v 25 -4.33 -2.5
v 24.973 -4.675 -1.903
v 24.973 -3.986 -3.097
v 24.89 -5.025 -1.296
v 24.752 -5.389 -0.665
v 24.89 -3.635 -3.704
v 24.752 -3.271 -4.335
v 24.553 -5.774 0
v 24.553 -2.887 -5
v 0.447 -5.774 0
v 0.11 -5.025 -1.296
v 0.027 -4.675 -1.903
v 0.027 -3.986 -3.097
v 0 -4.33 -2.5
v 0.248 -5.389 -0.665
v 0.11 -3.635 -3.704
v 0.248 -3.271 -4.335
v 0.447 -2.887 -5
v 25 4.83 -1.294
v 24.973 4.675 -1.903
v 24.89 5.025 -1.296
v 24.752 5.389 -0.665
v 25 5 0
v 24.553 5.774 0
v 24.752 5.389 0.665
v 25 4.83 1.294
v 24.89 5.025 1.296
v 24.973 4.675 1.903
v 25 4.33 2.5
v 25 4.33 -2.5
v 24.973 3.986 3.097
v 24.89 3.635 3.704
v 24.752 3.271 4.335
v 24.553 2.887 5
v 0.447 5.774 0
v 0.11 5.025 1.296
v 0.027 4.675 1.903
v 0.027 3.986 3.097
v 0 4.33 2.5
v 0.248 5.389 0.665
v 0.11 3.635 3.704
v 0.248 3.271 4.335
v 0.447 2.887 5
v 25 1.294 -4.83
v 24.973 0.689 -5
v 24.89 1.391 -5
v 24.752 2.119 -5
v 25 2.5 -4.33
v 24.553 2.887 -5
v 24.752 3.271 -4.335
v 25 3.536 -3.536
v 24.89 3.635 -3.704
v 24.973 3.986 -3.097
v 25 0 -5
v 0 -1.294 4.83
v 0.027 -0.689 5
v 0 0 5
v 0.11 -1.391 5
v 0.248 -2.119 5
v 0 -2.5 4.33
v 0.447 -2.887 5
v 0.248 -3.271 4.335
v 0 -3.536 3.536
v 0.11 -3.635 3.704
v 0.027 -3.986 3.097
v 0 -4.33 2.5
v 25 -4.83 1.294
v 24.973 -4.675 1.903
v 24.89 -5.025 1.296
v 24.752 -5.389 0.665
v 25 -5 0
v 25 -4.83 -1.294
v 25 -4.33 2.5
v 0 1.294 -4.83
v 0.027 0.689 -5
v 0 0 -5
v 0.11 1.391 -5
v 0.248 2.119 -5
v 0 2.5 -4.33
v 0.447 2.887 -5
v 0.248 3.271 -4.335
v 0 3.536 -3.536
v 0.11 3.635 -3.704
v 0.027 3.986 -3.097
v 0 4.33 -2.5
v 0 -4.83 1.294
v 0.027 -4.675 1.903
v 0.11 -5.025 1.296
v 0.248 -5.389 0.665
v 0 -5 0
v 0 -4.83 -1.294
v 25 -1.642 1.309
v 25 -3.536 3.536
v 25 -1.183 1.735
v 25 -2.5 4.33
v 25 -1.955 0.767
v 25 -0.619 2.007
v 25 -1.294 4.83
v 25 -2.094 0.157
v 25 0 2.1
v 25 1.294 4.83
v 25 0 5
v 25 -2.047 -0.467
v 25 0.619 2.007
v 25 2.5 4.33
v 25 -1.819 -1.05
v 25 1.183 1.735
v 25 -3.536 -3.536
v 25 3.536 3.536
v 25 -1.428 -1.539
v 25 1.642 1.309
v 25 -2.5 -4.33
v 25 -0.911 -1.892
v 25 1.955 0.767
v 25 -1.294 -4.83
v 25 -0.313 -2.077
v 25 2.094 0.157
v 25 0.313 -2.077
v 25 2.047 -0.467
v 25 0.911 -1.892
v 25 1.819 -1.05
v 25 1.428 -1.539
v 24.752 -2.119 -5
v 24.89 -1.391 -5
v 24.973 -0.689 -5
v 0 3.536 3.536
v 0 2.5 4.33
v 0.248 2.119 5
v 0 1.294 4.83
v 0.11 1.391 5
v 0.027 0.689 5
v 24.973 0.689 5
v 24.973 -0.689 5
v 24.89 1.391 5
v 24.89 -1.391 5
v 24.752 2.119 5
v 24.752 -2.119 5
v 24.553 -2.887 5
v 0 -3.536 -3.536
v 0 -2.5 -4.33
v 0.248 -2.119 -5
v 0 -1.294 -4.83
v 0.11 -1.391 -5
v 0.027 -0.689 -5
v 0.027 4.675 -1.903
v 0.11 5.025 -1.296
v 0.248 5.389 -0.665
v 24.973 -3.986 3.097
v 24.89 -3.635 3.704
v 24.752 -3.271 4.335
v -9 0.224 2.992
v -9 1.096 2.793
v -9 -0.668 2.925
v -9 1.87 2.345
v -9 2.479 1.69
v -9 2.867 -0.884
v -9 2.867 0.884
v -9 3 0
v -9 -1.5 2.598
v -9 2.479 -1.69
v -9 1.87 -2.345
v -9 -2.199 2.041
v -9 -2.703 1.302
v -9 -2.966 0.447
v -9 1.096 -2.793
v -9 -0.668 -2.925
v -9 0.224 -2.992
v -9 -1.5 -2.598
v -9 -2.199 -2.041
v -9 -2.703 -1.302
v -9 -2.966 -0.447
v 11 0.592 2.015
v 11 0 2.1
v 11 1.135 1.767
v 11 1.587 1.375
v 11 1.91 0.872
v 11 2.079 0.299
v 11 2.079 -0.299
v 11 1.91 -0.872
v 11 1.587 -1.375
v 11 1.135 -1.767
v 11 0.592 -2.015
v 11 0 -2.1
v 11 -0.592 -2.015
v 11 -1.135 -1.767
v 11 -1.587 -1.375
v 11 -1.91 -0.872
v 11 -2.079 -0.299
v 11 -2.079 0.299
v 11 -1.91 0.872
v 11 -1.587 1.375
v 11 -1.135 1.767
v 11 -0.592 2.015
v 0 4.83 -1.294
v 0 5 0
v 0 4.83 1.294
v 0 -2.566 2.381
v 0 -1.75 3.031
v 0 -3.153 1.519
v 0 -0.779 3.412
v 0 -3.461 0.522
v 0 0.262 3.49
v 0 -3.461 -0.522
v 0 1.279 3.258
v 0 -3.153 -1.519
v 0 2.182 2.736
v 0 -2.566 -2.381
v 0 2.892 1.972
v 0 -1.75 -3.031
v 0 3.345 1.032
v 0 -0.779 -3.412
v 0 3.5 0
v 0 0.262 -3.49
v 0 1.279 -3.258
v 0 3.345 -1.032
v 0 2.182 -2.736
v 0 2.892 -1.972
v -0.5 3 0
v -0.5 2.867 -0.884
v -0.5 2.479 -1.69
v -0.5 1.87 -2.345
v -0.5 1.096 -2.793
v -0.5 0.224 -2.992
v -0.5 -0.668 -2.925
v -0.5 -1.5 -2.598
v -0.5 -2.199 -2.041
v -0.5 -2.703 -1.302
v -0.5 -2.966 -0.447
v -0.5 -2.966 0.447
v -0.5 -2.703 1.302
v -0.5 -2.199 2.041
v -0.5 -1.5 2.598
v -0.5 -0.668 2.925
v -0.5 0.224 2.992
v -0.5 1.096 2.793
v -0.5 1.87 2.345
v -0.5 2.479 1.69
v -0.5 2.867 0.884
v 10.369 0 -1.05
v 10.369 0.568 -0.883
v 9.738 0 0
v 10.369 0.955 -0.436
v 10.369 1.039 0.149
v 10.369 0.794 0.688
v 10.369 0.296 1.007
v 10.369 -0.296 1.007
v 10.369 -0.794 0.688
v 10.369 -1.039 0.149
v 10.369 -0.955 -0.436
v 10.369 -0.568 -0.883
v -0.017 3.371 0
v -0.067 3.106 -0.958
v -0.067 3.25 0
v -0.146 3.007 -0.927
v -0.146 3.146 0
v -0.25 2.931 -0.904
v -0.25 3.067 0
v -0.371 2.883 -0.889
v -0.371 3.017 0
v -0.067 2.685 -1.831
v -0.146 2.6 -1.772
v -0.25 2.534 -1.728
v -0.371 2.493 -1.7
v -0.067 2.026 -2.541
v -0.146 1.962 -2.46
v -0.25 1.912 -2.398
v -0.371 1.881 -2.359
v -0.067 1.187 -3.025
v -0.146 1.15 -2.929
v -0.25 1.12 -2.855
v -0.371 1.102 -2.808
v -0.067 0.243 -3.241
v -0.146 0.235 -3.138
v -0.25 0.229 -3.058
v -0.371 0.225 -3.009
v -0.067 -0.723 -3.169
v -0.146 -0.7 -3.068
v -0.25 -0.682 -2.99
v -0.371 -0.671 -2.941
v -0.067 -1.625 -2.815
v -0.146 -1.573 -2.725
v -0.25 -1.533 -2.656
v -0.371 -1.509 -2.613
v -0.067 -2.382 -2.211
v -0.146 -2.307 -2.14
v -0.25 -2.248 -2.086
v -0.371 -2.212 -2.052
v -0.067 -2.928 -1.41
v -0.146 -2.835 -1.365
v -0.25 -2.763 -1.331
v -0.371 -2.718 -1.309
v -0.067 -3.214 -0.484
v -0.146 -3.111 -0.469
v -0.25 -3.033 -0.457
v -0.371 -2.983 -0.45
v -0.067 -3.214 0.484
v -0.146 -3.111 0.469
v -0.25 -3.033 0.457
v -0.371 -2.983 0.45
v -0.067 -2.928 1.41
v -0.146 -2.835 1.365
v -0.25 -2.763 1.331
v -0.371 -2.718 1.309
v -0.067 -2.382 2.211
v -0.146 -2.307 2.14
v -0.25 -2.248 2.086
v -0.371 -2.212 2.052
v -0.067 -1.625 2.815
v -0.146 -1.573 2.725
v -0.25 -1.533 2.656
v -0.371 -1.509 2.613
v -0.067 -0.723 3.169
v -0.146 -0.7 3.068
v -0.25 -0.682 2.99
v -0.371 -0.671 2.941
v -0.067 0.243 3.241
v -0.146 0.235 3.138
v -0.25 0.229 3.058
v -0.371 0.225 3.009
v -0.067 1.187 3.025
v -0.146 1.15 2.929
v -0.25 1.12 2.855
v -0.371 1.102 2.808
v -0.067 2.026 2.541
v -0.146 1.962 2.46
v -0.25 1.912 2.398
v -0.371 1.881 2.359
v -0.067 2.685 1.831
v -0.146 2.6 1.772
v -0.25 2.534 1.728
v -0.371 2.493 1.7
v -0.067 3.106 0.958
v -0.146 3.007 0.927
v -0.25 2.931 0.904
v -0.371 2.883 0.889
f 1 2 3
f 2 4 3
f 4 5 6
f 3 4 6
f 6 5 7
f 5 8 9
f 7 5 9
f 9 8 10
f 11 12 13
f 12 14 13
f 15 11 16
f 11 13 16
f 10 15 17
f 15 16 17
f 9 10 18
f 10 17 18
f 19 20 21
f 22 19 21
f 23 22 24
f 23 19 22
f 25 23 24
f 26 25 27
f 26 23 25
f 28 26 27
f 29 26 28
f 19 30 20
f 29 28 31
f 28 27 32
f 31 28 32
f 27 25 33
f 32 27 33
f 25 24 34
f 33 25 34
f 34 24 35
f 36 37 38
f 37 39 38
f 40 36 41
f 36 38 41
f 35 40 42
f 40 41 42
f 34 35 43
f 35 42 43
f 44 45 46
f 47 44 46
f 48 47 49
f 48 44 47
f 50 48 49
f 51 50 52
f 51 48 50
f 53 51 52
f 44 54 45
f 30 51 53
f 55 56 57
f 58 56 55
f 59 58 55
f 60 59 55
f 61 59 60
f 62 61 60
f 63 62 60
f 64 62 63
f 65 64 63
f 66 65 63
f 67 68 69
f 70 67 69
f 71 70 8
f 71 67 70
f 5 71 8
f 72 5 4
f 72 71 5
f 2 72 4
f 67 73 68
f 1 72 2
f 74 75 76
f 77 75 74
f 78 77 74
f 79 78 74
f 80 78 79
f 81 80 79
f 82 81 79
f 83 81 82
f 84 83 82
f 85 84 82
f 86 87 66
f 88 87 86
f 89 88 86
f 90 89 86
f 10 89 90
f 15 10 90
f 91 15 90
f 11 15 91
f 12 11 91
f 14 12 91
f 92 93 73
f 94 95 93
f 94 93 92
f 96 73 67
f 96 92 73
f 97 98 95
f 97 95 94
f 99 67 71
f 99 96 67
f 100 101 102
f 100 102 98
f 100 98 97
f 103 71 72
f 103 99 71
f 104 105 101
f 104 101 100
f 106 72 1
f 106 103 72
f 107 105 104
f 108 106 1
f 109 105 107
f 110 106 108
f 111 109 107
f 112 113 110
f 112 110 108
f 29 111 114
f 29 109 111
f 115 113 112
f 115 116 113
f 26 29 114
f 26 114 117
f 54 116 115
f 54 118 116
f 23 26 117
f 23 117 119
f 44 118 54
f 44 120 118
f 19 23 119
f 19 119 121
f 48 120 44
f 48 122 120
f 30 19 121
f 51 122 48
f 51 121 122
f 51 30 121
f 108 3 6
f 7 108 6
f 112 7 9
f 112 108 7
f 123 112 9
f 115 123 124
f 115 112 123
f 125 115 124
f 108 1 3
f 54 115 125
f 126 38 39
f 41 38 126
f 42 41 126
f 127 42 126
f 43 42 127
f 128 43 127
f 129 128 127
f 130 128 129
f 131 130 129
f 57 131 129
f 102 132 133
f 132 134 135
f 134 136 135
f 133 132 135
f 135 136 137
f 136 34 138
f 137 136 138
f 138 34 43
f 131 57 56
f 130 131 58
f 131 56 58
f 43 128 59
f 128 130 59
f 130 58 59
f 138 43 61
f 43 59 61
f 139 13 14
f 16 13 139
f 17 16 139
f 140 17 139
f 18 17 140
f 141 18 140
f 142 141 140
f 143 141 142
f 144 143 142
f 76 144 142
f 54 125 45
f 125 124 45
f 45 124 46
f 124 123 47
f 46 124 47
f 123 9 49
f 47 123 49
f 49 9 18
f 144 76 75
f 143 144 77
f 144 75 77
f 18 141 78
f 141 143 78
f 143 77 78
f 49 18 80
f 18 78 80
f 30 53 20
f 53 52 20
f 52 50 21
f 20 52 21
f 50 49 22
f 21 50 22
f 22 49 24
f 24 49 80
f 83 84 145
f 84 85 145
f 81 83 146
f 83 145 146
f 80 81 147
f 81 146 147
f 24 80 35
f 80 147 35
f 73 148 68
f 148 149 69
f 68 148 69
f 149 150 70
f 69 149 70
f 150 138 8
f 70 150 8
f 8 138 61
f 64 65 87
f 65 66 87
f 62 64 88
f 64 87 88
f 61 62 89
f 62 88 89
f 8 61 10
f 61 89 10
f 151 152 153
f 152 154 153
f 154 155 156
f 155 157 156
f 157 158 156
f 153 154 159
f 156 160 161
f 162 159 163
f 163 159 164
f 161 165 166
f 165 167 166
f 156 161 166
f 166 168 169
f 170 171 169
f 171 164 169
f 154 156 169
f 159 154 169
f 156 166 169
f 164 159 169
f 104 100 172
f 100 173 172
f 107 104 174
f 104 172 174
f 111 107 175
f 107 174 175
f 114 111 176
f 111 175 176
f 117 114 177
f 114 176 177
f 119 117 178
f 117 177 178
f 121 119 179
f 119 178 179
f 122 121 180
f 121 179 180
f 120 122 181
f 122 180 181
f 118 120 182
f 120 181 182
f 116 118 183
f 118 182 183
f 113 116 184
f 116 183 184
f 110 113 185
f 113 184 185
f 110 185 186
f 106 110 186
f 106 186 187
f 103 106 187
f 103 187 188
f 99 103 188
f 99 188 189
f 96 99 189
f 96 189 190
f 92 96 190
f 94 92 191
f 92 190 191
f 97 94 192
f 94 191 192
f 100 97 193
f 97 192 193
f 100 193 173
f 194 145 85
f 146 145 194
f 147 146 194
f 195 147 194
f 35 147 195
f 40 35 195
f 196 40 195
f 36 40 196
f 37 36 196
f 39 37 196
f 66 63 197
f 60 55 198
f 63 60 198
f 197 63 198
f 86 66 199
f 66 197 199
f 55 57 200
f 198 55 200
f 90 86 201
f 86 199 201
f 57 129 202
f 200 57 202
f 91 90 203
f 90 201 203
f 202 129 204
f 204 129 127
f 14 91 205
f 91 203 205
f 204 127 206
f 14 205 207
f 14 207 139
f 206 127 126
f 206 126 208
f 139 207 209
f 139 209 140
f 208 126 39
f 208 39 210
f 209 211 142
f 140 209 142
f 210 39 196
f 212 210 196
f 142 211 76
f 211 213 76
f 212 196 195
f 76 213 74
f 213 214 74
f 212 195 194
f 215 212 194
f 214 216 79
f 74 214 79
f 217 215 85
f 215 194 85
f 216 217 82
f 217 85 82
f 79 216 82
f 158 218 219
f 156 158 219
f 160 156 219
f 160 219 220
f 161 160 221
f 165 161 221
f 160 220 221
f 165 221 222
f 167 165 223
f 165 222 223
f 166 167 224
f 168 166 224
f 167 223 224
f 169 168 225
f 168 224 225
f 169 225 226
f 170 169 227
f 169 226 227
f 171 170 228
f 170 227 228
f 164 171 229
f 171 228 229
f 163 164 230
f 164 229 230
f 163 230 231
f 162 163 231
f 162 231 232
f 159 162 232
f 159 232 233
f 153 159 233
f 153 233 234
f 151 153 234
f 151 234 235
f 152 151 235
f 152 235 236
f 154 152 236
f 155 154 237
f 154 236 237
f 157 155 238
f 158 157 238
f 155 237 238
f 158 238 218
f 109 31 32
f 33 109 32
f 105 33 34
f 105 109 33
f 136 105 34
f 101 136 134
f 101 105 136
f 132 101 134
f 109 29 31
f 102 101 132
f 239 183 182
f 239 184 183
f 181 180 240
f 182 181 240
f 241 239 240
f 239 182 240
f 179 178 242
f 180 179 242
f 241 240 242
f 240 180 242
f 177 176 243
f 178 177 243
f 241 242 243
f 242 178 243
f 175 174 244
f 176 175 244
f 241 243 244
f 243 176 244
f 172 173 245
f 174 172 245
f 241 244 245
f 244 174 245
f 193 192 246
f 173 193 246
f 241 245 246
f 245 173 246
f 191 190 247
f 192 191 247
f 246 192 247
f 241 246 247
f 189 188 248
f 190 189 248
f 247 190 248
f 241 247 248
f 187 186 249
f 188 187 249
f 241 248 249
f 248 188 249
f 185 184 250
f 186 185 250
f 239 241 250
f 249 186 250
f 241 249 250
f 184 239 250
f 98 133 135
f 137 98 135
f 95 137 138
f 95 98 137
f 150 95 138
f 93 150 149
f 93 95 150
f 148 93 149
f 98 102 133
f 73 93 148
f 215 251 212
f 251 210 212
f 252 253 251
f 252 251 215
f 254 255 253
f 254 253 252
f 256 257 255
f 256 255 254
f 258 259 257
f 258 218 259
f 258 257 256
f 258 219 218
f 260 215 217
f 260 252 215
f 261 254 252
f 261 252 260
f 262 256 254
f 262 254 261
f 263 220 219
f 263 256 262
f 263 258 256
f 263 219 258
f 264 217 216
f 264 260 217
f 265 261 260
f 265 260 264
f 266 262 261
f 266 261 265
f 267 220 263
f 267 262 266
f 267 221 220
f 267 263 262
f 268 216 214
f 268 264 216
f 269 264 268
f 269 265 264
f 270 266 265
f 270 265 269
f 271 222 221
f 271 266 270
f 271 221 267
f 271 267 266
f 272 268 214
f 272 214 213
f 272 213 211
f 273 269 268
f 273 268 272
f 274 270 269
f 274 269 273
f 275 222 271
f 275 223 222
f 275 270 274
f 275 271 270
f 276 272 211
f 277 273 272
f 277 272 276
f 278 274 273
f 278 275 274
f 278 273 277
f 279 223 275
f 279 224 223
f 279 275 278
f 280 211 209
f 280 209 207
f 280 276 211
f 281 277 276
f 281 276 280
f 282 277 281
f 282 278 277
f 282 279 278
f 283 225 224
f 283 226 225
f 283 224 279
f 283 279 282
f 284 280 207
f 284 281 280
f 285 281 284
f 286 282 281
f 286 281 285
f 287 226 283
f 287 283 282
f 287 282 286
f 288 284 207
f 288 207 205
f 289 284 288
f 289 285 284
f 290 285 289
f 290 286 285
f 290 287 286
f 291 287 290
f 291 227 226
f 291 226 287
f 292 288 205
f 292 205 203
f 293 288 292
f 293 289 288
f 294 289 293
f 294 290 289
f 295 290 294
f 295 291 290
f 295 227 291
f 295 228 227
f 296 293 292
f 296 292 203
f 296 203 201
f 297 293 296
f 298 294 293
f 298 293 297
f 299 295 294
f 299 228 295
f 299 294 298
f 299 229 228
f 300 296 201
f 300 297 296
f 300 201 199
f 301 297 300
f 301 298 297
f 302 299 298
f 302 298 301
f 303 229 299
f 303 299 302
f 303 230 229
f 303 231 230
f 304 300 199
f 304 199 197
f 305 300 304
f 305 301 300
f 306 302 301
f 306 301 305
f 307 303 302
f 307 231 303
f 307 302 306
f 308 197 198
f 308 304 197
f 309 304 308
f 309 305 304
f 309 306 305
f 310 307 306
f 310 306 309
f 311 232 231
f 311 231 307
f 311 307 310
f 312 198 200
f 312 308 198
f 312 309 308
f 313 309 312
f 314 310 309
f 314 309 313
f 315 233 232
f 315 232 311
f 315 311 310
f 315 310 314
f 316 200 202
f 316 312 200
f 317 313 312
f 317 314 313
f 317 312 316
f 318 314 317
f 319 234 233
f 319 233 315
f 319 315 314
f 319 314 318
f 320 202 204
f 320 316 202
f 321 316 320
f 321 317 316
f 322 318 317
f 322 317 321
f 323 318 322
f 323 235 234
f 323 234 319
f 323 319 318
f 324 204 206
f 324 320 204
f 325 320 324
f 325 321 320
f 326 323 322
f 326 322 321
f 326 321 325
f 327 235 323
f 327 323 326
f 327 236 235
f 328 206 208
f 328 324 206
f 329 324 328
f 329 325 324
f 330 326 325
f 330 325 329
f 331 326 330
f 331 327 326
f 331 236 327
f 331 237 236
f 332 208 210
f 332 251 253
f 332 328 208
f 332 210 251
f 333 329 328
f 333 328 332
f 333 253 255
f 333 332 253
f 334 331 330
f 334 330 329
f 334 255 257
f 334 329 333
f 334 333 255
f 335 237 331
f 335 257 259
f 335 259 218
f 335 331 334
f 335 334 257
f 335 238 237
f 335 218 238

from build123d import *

# Parameters (mm, degrees)
BOSS_EXTRUDE1_DEPTH = 25
SKETCH3_W           = 9
SKETCH3_H           = 3
TAPPED_HOLE1_D      = 4.2
TAPPED_HOLE1_DEPTH  = 14
TAPPED_HOLE1_TIP    = 1.2618073
FILLET1_R           = 0.5


with BuildPart() as part:
    # Sketch1 → Boss-Extrude1 (new body)
    with BuildSketch(Plane(origin=(0, 0, 0), x_dir=(0, 0, -1), z_dir=(1, 0, 0))):
        Polygon((0, 5.773502692), (-5, 2.886751346), (-5, -2.886751346), (0, -5.773502692), (5, -2.886751346), (5, 2.886751346), align=None)
    extrude(amount=BOSS_EXTRUDE1_DEPTH)

    # Sketch2 → Cut-Revolve1 (revolve, cut)
    with BuildSketch(Plane.XY):
        Polygon((0.446581987, 5.773502692), (0, 5.773502692), (0, 5), align=None)
        Polygon((25, 5), (25, 5.773502692), (24.553418013, 5.773502692), align=None)
    revolve(axis=Axis((0, 0, 0), (1, 0, 0)), mode=Mode.SUBTRACT)

    # Sketch3 → Revolve1 (revolve)
    with BuildSketch(Plane.XY):
        with Locations((-4.5, 1.5)):
            Rectangle(SKETCH3_W, SKETCH3_H)
    revolve(axis=Axis((0, 0, 0), (-1, 0, 0)))

    # Tapped Hole1
    with Locations(Plane(origin=(25, 0, 0), x_dir=(0, 0, -1), z_dir=(1, 0, 0))):
        with Locations((0, 0)):
            Hole(TAPPED_HOLE1_D / 2, depth=TAPPED_HOLE1_DEPTH)
            with Locations((0, 0, -(TAPPED_HOLE1_DEPTH + TAPPED_HOLE1_TIP / 2))):  # 118° drill point
                Cone(0, TAPPED_HOLE1_D / 2, TAPPED_HOLE1_TIP, mode=Mode.SUBTRACT)

    # Fillet1
    fillet1_edges = [part.edges().sort_by_distance(p)[0] for p in [
        (0, -3, 0),
    ]]
    fillet(fillet1_edges, radius=FILLET1_R)


solid = part.part
